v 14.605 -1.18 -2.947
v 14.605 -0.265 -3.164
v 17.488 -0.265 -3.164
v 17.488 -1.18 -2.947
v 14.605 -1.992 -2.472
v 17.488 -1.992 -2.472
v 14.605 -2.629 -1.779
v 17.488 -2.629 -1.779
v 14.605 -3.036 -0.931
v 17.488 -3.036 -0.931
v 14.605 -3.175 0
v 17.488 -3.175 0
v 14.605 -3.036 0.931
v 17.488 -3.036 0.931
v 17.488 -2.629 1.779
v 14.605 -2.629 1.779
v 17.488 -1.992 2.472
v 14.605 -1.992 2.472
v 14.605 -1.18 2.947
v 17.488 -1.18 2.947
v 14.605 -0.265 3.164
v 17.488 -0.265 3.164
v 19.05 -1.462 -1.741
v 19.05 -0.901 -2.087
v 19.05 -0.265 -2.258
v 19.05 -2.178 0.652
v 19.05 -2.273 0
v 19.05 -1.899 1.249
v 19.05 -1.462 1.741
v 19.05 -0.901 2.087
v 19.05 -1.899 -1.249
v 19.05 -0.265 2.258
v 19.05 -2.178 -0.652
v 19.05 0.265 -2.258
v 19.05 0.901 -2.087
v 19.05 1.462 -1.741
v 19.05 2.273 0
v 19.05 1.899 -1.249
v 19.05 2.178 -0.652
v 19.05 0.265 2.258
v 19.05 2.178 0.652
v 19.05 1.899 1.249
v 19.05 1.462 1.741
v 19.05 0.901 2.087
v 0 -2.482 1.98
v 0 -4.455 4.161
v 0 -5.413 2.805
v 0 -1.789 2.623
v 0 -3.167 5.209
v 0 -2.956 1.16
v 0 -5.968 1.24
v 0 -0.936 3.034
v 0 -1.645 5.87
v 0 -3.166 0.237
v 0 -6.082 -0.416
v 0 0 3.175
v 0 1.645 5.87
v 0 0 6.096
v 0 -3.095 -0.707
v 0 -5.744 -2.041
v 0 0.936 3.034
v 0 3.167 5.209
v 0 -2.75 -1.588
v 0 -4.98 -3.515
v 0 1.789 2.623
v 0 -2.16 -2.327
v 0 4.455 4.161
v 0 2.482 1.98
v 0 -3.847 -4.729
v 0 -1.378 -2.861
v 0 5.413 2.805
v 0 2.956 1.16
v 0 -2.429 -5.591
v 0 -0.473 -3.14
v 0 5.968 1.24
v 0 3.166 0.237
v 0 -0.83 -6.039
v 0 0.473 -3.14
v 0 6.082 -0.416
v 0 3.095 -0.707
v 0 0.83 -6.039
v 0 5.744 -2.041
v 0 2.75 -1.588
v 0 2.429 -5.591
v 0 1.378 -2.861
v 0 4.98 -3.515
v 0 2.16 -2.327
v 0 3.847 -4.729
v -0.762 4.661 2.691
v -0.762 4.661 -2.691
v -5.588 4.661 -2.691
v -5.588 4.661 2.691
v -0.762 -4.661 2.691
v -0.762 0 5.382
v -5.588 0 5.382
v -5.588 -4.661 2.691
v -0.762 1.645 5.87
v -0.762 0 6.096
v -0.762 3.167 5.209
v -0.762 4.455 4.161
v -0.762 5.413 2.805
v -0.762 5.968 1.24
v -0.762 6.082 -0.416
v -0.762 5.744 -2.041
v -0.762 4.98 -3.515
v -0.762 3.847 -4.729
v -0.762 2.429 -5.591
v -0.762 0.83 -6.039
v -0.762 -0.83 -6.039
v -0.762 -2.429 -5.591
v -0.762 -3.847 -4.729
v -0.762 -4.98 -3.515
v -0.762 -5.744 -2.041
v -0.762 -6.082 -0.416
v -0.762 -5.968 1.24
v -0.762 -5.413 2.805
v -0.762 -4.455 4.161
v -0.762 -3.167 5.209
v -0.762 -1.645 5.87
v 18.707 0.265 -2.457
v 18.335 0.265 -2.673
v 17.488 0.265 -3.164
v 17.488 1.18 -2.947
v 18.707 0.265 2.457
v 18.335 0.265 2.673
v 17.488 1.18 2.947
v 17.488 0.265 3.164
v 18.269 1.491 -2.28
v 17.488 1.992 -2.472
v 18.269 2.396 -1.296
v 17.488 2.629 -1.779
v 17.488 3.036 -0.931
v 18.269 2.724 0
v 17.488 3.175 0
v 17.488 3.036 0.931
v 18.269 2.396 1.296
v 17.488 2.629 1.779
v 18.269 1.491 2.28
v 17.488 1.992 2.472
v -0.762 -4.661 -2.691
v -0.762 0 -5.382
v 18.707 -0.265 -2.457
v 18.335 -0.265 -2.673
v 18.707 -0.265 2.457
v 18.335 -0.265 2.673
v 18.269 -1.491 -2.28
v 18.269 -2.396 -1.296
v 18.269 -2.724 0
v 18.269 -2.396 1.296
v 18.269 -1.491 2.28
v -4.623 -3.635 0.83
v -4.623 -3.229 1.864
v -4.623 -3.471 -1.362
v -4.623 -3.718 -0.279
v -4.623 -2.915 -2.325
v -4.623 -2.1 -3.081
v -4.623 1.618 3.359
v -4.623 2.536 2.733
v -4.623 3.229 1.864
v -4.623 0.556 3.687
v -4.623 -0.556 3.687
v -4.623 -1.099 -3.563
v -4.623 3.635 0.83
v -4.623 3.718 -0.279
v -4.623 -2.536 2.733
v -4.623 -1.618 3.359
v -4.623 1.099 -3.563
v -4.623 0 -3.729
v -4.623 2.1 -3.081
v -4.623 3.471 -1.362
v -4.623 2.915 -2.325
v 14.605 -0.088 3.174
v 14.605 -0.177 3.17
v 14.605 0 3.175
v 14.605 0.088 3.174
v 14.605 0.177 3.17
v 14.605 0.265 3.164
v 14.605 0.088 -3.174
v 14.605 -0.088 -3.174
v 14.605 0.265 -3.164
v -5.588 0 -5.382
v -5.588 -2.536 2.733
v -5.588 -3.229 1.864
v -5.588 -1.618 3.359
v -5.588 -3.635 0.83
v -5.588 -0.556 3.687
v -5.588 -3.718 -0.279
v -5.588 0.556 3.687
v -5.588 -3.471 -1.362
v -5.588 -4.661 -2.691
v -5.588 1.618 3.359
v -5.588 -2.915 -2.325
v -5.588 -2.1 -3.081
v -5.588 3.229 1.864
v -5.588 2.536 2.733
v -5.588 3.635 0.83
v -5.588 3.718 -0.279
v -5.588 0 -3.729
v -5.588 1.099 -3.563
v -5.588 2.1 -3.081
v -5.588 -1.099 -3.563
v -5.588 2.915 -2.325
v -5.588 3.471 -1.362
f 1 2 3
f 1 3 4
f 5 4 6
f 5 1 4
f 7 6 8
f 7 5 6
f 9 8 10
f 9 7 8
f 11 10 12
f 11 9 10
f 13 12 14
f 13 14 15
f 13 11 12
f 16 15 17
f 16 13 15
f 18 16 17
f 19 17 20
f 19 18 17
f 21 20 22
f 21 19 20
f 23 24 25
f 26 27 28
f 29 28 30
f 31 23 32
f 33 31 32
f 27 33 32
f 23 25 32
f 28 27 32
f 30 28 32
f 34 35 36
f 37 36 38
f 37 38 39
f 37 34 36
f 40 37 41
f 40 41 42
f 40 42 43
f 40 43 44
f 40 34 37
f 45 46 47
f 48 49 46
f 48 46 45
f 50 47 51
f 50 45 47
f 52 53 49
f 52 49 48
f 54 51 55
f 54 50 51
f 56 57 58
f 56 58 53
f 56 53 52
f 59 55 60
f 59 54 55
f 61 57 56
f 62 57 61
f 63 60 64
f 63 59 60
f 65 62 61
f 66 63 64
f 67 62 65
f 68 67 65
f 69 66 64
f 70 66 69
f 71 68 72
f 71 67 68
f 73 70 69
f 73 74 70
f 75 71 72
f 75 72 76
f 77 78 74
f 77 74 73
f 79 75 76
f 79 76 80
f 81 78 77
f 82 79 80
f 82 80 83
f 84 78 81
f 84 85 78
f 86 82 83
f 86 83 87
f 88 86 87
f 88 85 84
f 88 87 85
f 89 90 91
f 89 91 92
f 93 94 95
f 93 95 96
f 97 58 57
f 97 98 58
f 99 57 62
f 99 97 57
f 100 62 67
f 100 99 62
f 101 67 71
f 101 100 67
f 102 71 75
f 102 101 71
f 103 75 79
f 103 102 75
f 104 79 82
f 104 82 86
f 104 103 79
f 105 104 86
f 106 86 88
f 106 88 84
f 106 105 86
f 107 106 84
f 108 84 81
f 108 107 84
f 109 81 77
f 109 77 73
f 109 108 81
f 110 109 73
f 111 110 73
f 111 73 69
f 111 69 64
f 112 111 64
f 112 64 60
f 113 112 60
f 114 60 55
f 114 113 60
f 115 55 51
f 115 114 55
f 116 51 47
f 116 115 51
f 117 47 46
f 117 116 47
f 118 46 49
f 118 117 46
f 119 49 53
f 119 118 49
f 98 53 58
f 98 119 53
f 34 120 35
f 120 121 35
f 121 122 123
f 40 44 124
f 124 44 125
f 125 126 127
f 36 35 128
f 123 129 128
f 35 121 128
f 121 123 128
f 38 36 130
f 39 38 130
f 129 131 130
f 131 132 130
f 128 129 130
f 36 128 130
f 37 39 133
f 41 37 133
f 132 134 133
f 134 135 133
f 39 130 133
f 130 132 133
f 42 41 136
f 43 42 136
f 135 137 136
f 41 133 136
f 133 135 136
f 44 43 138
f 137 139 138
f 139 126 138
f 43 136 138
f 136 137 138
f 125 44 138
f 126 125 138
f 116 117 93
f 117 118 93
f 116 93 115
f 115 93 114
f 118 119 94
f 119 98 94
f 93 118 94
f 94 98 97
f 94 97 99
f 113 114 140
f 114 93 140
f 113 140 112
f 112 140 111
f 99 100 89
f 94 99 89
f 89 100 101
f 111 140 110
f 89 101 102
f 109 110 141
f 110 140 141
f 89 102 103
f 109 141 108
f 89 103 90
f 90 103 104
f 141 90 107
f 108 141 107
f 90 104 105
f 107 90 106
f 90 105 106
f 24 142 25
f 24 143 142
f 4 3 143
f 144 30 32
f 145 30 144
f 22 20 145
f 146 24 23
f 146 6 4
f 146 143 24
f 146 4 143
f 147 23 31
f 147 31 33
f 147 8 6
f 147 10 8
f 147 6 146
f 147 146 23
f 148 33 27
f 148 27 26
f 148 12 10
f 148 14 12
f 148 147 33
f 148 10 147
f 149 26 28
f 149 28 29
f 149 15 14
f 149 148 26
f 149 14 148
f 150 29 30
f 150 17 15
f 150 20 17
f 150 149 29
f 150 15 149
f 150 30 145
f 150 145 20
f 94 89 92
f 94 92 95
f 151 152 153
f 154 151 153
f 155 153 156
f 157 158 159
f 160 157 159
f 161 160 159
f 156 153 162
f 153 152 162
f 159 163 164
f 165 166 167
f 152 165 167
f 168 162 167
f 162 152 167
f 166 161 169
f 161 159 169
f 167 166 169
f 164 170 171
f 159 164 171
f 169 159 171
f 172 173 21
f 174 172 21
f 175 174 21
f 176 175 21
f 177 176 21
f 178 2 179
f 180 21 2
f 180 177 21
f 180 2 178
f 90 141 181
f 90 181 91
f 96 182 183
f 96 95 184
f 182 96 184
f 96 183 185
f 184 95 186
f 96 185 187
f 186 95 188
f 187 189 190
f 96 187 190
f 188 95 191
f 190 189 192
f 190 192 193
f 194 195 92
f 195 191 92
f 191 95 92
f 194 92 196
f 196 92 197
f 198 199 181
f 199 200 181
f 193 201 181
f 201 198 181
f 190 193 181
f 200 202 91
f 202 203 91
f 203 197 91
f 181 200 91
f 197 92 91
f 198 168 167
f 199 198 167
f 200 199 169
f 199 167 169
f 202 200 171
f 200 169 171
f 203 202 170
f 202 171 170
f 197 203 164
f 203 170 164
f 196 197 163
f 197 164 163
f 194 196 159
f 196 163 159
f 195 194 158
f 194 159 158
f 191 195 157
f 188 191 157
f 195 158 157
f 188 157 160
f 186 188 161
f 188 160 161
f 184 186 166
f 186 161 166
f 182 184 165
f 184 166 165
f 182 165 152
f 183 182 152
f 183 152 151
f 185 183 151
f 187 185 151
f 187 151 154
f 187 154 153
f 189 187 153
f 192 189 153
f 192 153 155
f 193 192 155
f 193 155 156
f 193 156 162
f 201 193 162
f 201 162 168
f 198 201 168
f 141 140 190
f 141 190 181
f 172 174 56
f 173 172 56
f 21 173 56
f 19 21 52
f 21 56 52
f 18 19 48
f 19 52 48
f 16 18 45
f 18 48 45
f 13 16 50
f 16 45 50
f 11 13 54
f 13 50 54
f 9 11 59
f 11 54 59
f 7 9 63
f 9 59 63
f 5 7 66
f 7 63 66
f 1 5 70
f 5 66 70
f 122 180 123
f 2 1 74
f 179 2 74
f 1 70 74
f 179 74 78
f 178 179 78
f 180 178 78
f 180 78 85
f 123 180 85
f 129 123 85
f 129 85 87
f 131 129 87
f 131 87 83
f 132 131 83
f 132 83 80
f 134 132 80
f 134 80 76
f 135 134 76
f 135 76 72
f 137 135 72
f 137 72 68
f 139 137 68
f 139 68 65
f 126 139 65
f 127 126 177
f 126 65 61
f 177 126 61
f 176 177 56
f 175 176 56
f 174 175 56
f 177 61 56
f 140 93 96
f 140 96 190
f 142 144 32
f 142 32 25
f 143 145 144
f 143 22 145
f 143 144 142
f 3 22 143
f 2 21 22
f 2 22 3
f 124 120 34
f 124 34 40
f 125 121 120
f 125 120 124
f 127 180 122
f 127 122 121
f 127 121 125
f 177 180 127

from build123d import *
from OCP.BRepFilletAPI import BRepFilletAPI_MakeChamfer
from build123d.topology import SkipClean

# Parameters (mm, degrees)
SKETCH1_W                  = 0.762
SKETCH1_H                  = 6.096
SKETCH2_R                  = 3.175
BOSS_EXTRUDE1_DEPTH        = 19.05
CUT_EXTRUDE1_START         = -4.445
CUT_EXTRUDE1_DEPTH         = 4.445
BOSS_EXTRUDE2_DEPTH        = 4.445
BOSS_EXTRUDE3_DEPTH        = 4.826
M6_5_CLEARANCE_HOLE1_D     = 7.45744
M6_5_CLEARANCE_HOLE1_DEPTH = 0.9652
CHAMFER1_SIZE              = 0.9017
CHAMFER1_SIZE2             = 1.561790213


with BuildPart() as part:
    # Sketch1 → Revolve1 (revolve)
    with BuildSketch(Plane(origin=(0, 0, 0), x_dir=(-1, 0, 0), z_dir=(0, 0, -1)), mode=Mode.PRIVATE) as revolve1_sk:
        with Locations((0.381, 3.048)):
            Rectangle(SKETCH1_W, SKETCH1_H)
    revolve(revolve1_sk.sketch.rotate(Axis((0, 0, 0), (-1, 0, 0)), 270), axis=Axis((0, 0, 0), (-1, 0, 0)))

    # Sketch2 → Boss-Extrude1 (add)
    with BuildSketch(Plane(origin=(0, 0, 0), x_dir=(0, 0, -1), z_dir=(1, 0, 0))):
        with Locations(Location((0, 0, 0), (0, 0, 180))):
            Circle(SKETCH2_R)
    extrude(amount=BOSS_EXTRUDE1_DEPTH)

    # Sketch3 → Cut-Extrude1 (cut)
    with BuildSketch(Plane(origin=(19.05, 0, 0), x_dir=(0, 0, -1), z_dir=(1, 0, 0)).offset(CUT_EXTRUDE1_START)):
        with BuildLine():
            Line((3.163956488, 0.264583333), (-3.163956488, 0.264583333))
            ThreePointArc((-3.163956488, 0.264583333), (0, -3.175), (3.163956488, 0.264583333))
        make_face()
    extrude(amount=CUT_EXTRUDE1_DEPTH, mode=Mode.SUBTRACT)

    # Sketch4 → Boss-Extrude2 (add)
    with SkipClean():  # the faces are left unmerged after this step: merging them gives an invalid solid
        with BuildSketch(Plane(origin=(14.605, 0, 0), x_dir=(0, 0, -1), z_dir=(1, 0, 0))):
            with BuildLine():
                Line((-3.163956488, -0.264583333), (3.163956488, -0.264583333))
                ThreePointArc((3.163956488, -0.264583333), (0, -3.175), (-3.163956488, -0.264583333))
            make_face()
        extrude(amount=BOSS_EXTRUDE2_DEPTH)

    # Sketch5 → Boss-Extrude3 (add)
    with SkipClean():  # the faces are left unmerged after this step: merging them gives an invalid solid
        with BuildSketch(Plane.ZY.offset(0.762)):
            Polygon((-5.381943739, 0), (-2.69097187, 4.6609), (2.69097187, 4.6609), (5.381943739, 0), (2.69097187, -4.6609), (-2.69097187, -4.6609), align=None)
        extrude(amount=BOSS_EXTRUDE3_DEPTH)

    # M6.5 Clearance Hole1
    with Locations(Plane.ZY.offset(5.588)):
        with Locations((0, 0)):
            Hole(M6_5_CLEARANCE_HOLE1_D / 2, depth=M6_5_CLEARANCE_HOLE1_DEPTH)

    # Chamfer1: one chamfer whose edges measure the first distance from different faces: ONE call of the kernel's chamfer builder (chamfer() names one face for all edges)
    chamfer1_edges_1 = [part.edges().sort_by_distance(p)[0] for p in [
        (19.05, -3.175, 0),
    ]]
    chamfer1_side_1 = [part.faces().sort_by_distance(p)[0] for p in [
        (19.05, -1.491577602, 0),
    ]]
    chamfer1_edges_2 = [part.edges().sort_by_distance(p)[0] for p in [
        (19.05, 3.175, 0),
    ]]
    chamfer1_side_2 = [part.faces().sort_by_distance(p)[0] for p in [
        (19.05, 1.491577602, 0),
    ]]
    chamfer1 = BRepFilletAPI_MakeChamfer(part.part.solid().wrapped)
    for e in chamfer1_edges_1:
        chamfer1.Add(CHAMFER1_SIZE, CHAMFER1_SIZE2, e.wrapped, chamfer1_side_1[0].wrapped)  # the first distance lies on this face
    for e in chamfer1_edges_2:
        chamfer1.Add(CHAMFER1_SIZE, CHAMFER1_SIZE2, e.wrapped, chamfer1_side_2[0].wrapped)  # the first distance lies on this face
    add(Compound.cast(chamfer1.Shape()), mode=Mode.REPLACE)


solid = part.part
